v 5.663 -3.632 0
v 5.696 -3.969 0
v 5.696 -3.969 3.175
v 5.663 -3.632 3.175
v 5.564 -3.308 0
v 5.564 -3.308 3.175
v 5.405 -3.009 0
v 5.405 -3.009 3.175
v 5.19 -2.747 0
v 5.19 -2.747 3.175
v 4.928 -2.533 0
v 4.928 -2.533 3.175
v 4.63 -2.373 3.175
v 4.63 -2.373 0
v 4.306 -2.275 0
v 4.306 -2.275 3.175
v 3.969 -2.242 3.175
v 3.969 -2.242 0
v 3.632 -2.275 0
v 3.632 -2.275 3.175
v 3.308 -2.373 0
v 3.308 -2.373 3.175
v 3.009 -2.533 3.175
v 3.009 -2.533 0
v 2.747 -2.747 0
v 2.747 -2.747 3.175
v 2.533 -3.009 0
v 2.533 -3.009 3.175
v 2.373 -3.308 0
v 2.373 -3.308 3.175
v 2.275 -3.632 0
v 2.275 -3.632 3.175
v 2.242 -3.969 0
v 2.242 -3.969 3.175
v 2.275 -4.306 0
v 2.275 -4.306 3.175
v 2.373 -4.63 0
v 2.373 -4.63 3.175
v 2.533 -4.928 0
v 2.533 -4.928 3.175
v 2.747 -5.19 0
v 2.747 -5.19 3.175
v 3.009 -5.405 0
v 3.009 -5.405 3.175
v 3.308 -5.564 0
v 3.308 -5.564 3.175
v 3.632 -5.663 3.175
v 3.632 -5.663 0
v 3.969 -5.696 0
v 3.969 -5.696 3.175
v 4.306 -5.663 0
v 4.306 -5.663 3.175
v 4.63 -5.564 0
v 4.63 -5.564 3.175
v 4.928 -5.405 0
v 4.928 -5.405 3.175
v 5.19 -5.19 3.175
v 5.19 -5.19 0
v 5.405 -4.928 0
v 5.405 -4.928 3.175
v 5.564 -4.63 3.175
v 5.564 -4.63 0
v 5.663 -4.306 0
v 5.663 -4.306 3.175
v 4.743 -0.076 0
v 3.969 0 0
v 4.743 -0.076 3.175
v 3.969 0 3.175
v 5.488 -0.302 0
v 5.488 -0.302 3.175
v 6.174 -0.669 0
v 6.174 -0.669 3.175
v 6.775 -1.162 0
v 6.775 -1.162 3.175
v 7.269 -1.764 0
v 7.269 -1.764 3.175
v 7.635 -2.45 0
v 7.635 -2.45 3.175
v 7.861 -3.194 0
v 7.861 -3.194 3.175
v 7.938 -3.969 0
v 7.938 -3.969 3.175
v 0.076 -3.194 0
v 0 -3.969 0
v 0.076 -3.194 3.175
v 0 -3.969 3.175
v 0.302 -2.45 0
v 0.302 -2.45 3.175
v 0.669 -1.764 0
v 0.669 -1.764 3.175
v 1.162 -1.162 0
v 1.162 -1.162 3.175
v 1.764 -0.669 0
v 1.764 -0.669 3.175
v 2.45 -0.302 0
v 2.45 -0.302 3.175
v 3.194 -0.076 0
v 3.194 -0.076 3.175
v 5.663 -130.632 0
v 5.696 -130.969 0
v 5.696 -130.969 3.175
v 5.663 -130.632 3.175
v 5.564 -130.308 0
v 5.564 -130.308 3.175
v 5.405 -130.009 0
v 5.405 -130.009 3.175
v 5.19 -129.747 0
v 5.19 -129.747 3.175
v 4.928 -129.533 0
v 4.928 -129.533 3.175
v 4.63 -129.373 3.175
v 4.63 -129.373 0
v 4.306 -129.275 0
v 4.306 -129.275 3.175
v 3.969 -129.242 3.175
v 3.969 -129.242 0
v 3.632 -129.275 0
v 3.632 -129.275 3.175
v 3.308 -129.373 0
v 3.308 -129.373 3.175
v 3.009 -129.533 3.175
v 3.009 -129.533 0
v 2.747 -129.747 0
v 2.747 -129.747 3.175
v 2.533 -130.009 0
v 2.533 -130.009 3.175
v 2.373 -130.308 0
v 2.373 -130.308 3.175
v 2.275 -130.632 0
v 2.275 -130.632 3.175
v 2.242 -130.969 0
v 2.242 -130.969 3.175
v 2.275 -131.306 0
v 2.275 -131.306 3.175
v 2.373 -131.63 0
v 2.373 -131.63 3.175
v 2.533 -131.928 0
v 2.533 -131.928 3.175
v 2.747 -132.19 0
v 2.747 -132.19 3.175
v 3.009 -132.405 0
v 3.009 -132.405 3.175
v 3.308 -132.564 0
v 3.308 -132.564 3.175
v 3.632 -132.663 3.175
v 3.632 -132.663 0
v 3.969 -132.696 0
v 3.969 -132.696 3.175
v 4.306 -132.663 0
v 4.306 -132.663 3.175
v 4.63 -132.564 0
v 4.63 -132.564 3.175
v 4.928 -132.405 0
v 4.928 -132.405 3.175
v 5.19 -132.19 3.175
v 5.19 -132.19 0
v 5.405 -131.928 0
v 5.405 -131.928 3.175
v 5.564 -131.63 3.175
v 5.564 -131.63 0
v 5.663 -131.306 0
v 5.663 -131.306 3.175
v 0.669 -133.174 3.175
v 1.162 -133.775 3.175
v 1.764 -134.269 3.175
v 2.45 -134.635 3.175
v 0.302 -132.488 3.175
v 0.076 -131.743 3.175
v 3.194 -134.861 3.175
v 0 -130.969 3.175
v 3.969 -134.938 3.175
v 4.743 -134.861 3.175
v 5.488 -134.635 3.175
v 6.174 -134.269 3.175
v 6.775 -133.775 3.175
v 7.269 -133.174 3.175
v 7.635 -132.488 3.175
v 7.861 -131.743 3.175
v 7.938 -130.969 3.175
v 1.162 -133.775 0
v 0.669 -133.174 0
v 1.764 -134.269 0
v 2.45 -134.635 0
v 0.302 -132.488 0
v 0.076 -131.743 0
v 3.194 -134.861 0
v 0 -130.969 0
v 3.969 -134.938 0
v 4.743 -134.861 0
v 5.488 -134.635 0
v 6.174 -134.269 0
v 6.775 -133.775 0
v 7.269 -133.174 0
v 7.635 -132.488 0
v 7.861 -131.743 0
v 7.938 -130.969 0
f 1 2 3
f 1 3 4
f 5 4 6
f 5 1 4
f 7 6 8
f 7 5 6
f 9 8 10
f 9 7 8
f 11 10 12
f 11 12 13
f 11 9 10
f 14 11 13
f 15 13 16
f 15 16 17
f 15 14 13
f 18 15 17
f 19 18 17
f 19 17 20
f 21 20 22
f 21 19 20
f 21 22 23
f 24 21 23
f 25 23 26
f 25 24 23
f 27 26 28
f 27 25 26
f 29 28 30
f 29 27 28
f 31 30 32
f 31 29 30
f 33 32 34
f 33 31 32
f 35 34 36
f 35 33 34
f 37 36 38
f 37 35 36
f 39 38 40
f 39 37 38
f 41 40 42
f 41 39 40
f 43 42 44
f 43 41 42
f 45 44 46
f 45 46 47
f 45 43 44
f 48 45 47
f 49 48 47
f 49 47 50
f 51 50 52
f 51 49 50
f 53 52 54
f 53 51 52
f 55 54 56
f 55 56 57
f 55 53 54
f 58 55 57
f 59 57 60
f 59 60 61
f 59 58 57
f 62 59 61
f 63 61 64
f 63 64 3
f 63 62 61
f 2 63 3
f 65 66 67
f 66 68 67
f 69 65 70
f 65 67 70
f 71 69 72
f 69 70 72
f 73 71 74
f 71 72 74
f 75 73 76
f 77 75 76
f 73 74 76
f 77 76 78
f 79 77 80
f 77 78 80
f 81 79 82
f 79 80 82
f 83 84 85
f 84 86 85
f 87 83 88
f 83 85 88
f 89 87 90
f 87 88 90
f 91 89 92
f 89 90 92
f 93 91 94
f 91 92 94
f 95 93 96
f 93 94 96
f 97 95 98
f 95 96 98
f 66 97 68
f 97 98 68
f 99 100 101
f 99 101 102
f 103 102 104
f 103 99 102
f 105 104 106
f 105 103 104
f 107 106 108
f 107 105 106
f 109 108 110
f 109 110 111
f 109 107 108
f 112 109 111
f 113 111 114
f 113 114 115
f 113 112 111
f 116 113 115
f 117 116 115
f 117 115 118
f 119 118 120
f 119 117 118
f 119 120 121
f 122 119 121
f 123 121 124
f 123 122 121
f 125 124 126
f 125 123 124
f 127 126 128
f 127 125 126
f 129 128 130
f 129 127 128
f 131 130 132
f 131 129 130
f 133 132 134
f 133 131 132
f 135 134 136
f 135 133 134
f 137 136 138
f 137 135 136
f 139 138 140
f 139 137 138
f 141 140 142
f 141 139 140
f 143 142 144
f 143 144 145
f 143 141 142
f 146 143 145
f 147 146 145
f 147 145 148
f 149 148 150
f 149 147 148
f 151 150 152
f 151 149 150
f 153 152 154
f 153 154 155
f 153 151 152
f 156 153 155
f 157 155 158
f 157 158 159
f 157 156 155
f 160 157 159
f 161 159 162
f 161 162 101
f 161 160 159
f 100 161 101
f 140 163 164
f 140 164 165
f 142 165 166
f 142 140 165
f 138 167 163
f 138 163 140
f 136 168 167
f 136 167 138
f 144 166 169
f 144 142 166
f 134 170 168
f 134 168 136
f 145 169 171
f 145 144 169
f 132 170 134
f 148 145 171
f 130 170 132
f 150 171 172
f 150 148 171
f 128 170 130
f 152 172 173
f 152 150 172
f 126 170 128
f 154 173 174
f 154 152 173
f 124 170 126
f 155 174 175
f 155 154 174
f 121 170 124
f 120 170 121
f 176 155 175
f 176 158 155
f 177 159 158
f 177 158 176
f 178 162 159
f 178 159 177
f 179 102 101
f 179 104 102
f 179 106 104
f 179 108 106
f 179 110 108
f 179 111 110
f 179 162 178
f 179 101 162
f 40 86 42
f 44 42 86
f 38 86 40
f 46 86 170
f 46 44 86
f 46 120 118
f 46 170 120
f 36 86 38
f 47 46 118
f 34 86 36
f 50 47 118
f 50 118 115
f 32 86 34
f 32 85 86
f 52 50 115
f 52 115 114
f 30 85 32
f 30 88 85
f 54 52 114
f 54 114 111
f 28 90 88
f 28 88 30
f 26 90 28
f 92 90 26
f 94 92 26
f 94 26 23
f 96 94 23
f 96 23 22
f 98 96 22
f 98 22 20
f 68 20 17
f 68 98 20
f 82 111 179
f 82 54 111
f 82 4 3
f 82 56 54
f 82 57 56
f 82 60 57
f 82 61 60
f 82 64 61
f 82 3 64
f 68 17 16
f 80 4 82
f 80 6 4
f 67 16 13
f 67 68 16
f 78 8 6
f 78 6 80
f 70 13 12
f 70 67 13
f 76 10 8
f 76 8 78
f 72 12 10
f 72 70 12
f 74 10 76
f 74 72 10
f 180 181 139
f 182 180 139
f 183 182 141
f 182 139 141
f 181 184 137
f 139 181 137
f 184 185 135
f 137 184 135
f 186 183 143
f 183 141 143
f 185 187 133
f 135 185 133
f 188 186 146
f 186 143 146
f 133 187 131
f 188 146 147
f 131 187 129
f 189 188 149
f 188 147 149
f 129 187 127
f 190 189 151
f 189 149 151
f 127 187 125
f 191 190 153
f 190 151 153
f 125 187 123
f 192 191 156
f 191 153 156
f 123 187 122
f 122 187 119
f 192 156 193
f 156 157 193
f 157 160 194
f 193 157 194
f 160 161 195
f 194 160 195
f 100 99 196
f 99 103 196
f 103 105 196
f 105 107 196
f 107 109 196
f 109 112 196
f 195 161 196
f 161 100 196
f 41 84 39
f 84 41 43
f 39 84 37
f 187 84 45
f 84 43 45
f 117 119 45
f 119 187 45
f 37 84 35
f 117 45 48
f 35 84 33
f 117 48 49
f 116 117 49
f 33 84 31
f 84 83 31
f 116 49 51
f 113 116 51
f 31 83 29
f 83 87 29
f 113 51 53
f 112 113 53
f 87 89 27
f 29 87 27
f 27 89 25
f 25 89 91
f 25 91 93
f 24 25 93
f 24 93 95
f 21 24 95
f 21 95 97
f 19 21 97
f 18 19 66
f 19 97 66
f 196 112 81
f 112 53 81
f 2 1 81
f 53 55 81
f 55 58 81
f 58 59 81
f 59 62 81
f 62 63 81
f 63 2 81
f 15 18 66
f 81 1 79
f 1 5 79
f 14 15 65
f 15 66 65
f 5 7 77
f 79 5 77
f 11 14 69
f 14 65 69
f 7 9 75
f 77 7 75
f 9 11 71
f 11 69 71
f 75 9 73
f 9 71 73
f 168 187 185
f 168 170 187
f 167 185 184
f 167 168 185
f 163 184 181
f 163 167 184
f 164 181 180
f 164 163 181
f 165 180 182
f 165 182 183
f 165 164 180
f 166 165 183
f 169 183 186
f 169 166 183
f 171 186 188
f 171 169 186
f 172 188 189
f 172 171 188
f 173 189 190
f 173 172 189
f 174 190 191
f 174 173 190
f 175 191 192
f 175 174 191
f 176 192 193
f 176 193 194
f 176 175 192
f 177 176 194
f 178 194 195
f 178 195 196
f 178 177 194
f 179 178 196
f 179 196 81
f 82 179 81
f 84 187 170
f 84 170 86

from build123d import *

# Parameters (mm, degrees)
F0_W     = 7.9375
F0_H     = 134.9375
F0_R     = 1.7272
F1_DEPTH = 3.175
F2_R     = 3.96874


# Not quite as in the source:
# - a fillet or chamfer is up to 0.001 mm smaller than in the source, because OpenCascade refuses the exact size


with BuildPart() as f1:
    # F0 (on Top) → F1 (new body)
    with BuildSketch(Plane.XY):
        with Locations((3.96875, -67.46875)):
            Rectangle(F0_W, F0_H)
        with Locations((3.96875, -130.96875)):
            Circle(F0_R, mode=Mode.SUBTRACT)
        with Locations((3.96875, -3.96875)):
            Circle(F0_R, mode=Mode.SUBTRACT)
    extrude(amount=F1_DEPTH)

    # F2 (radius 3.96875 in the source; OpenCascade refuses exactly that, so slightly less here)
    f2_edges = [f1.edges().sort_by_distance(p)[0] for p in [
        (7.9375, 0, 1.5875),
        (0, 0, 1.5875),
        (0, -134.9375, 1.5875),
        (7.9375, -134.9375, 1.5875),
    ]]
    fillet(f2_edges, radius=F2_R)


solid = f1.part
